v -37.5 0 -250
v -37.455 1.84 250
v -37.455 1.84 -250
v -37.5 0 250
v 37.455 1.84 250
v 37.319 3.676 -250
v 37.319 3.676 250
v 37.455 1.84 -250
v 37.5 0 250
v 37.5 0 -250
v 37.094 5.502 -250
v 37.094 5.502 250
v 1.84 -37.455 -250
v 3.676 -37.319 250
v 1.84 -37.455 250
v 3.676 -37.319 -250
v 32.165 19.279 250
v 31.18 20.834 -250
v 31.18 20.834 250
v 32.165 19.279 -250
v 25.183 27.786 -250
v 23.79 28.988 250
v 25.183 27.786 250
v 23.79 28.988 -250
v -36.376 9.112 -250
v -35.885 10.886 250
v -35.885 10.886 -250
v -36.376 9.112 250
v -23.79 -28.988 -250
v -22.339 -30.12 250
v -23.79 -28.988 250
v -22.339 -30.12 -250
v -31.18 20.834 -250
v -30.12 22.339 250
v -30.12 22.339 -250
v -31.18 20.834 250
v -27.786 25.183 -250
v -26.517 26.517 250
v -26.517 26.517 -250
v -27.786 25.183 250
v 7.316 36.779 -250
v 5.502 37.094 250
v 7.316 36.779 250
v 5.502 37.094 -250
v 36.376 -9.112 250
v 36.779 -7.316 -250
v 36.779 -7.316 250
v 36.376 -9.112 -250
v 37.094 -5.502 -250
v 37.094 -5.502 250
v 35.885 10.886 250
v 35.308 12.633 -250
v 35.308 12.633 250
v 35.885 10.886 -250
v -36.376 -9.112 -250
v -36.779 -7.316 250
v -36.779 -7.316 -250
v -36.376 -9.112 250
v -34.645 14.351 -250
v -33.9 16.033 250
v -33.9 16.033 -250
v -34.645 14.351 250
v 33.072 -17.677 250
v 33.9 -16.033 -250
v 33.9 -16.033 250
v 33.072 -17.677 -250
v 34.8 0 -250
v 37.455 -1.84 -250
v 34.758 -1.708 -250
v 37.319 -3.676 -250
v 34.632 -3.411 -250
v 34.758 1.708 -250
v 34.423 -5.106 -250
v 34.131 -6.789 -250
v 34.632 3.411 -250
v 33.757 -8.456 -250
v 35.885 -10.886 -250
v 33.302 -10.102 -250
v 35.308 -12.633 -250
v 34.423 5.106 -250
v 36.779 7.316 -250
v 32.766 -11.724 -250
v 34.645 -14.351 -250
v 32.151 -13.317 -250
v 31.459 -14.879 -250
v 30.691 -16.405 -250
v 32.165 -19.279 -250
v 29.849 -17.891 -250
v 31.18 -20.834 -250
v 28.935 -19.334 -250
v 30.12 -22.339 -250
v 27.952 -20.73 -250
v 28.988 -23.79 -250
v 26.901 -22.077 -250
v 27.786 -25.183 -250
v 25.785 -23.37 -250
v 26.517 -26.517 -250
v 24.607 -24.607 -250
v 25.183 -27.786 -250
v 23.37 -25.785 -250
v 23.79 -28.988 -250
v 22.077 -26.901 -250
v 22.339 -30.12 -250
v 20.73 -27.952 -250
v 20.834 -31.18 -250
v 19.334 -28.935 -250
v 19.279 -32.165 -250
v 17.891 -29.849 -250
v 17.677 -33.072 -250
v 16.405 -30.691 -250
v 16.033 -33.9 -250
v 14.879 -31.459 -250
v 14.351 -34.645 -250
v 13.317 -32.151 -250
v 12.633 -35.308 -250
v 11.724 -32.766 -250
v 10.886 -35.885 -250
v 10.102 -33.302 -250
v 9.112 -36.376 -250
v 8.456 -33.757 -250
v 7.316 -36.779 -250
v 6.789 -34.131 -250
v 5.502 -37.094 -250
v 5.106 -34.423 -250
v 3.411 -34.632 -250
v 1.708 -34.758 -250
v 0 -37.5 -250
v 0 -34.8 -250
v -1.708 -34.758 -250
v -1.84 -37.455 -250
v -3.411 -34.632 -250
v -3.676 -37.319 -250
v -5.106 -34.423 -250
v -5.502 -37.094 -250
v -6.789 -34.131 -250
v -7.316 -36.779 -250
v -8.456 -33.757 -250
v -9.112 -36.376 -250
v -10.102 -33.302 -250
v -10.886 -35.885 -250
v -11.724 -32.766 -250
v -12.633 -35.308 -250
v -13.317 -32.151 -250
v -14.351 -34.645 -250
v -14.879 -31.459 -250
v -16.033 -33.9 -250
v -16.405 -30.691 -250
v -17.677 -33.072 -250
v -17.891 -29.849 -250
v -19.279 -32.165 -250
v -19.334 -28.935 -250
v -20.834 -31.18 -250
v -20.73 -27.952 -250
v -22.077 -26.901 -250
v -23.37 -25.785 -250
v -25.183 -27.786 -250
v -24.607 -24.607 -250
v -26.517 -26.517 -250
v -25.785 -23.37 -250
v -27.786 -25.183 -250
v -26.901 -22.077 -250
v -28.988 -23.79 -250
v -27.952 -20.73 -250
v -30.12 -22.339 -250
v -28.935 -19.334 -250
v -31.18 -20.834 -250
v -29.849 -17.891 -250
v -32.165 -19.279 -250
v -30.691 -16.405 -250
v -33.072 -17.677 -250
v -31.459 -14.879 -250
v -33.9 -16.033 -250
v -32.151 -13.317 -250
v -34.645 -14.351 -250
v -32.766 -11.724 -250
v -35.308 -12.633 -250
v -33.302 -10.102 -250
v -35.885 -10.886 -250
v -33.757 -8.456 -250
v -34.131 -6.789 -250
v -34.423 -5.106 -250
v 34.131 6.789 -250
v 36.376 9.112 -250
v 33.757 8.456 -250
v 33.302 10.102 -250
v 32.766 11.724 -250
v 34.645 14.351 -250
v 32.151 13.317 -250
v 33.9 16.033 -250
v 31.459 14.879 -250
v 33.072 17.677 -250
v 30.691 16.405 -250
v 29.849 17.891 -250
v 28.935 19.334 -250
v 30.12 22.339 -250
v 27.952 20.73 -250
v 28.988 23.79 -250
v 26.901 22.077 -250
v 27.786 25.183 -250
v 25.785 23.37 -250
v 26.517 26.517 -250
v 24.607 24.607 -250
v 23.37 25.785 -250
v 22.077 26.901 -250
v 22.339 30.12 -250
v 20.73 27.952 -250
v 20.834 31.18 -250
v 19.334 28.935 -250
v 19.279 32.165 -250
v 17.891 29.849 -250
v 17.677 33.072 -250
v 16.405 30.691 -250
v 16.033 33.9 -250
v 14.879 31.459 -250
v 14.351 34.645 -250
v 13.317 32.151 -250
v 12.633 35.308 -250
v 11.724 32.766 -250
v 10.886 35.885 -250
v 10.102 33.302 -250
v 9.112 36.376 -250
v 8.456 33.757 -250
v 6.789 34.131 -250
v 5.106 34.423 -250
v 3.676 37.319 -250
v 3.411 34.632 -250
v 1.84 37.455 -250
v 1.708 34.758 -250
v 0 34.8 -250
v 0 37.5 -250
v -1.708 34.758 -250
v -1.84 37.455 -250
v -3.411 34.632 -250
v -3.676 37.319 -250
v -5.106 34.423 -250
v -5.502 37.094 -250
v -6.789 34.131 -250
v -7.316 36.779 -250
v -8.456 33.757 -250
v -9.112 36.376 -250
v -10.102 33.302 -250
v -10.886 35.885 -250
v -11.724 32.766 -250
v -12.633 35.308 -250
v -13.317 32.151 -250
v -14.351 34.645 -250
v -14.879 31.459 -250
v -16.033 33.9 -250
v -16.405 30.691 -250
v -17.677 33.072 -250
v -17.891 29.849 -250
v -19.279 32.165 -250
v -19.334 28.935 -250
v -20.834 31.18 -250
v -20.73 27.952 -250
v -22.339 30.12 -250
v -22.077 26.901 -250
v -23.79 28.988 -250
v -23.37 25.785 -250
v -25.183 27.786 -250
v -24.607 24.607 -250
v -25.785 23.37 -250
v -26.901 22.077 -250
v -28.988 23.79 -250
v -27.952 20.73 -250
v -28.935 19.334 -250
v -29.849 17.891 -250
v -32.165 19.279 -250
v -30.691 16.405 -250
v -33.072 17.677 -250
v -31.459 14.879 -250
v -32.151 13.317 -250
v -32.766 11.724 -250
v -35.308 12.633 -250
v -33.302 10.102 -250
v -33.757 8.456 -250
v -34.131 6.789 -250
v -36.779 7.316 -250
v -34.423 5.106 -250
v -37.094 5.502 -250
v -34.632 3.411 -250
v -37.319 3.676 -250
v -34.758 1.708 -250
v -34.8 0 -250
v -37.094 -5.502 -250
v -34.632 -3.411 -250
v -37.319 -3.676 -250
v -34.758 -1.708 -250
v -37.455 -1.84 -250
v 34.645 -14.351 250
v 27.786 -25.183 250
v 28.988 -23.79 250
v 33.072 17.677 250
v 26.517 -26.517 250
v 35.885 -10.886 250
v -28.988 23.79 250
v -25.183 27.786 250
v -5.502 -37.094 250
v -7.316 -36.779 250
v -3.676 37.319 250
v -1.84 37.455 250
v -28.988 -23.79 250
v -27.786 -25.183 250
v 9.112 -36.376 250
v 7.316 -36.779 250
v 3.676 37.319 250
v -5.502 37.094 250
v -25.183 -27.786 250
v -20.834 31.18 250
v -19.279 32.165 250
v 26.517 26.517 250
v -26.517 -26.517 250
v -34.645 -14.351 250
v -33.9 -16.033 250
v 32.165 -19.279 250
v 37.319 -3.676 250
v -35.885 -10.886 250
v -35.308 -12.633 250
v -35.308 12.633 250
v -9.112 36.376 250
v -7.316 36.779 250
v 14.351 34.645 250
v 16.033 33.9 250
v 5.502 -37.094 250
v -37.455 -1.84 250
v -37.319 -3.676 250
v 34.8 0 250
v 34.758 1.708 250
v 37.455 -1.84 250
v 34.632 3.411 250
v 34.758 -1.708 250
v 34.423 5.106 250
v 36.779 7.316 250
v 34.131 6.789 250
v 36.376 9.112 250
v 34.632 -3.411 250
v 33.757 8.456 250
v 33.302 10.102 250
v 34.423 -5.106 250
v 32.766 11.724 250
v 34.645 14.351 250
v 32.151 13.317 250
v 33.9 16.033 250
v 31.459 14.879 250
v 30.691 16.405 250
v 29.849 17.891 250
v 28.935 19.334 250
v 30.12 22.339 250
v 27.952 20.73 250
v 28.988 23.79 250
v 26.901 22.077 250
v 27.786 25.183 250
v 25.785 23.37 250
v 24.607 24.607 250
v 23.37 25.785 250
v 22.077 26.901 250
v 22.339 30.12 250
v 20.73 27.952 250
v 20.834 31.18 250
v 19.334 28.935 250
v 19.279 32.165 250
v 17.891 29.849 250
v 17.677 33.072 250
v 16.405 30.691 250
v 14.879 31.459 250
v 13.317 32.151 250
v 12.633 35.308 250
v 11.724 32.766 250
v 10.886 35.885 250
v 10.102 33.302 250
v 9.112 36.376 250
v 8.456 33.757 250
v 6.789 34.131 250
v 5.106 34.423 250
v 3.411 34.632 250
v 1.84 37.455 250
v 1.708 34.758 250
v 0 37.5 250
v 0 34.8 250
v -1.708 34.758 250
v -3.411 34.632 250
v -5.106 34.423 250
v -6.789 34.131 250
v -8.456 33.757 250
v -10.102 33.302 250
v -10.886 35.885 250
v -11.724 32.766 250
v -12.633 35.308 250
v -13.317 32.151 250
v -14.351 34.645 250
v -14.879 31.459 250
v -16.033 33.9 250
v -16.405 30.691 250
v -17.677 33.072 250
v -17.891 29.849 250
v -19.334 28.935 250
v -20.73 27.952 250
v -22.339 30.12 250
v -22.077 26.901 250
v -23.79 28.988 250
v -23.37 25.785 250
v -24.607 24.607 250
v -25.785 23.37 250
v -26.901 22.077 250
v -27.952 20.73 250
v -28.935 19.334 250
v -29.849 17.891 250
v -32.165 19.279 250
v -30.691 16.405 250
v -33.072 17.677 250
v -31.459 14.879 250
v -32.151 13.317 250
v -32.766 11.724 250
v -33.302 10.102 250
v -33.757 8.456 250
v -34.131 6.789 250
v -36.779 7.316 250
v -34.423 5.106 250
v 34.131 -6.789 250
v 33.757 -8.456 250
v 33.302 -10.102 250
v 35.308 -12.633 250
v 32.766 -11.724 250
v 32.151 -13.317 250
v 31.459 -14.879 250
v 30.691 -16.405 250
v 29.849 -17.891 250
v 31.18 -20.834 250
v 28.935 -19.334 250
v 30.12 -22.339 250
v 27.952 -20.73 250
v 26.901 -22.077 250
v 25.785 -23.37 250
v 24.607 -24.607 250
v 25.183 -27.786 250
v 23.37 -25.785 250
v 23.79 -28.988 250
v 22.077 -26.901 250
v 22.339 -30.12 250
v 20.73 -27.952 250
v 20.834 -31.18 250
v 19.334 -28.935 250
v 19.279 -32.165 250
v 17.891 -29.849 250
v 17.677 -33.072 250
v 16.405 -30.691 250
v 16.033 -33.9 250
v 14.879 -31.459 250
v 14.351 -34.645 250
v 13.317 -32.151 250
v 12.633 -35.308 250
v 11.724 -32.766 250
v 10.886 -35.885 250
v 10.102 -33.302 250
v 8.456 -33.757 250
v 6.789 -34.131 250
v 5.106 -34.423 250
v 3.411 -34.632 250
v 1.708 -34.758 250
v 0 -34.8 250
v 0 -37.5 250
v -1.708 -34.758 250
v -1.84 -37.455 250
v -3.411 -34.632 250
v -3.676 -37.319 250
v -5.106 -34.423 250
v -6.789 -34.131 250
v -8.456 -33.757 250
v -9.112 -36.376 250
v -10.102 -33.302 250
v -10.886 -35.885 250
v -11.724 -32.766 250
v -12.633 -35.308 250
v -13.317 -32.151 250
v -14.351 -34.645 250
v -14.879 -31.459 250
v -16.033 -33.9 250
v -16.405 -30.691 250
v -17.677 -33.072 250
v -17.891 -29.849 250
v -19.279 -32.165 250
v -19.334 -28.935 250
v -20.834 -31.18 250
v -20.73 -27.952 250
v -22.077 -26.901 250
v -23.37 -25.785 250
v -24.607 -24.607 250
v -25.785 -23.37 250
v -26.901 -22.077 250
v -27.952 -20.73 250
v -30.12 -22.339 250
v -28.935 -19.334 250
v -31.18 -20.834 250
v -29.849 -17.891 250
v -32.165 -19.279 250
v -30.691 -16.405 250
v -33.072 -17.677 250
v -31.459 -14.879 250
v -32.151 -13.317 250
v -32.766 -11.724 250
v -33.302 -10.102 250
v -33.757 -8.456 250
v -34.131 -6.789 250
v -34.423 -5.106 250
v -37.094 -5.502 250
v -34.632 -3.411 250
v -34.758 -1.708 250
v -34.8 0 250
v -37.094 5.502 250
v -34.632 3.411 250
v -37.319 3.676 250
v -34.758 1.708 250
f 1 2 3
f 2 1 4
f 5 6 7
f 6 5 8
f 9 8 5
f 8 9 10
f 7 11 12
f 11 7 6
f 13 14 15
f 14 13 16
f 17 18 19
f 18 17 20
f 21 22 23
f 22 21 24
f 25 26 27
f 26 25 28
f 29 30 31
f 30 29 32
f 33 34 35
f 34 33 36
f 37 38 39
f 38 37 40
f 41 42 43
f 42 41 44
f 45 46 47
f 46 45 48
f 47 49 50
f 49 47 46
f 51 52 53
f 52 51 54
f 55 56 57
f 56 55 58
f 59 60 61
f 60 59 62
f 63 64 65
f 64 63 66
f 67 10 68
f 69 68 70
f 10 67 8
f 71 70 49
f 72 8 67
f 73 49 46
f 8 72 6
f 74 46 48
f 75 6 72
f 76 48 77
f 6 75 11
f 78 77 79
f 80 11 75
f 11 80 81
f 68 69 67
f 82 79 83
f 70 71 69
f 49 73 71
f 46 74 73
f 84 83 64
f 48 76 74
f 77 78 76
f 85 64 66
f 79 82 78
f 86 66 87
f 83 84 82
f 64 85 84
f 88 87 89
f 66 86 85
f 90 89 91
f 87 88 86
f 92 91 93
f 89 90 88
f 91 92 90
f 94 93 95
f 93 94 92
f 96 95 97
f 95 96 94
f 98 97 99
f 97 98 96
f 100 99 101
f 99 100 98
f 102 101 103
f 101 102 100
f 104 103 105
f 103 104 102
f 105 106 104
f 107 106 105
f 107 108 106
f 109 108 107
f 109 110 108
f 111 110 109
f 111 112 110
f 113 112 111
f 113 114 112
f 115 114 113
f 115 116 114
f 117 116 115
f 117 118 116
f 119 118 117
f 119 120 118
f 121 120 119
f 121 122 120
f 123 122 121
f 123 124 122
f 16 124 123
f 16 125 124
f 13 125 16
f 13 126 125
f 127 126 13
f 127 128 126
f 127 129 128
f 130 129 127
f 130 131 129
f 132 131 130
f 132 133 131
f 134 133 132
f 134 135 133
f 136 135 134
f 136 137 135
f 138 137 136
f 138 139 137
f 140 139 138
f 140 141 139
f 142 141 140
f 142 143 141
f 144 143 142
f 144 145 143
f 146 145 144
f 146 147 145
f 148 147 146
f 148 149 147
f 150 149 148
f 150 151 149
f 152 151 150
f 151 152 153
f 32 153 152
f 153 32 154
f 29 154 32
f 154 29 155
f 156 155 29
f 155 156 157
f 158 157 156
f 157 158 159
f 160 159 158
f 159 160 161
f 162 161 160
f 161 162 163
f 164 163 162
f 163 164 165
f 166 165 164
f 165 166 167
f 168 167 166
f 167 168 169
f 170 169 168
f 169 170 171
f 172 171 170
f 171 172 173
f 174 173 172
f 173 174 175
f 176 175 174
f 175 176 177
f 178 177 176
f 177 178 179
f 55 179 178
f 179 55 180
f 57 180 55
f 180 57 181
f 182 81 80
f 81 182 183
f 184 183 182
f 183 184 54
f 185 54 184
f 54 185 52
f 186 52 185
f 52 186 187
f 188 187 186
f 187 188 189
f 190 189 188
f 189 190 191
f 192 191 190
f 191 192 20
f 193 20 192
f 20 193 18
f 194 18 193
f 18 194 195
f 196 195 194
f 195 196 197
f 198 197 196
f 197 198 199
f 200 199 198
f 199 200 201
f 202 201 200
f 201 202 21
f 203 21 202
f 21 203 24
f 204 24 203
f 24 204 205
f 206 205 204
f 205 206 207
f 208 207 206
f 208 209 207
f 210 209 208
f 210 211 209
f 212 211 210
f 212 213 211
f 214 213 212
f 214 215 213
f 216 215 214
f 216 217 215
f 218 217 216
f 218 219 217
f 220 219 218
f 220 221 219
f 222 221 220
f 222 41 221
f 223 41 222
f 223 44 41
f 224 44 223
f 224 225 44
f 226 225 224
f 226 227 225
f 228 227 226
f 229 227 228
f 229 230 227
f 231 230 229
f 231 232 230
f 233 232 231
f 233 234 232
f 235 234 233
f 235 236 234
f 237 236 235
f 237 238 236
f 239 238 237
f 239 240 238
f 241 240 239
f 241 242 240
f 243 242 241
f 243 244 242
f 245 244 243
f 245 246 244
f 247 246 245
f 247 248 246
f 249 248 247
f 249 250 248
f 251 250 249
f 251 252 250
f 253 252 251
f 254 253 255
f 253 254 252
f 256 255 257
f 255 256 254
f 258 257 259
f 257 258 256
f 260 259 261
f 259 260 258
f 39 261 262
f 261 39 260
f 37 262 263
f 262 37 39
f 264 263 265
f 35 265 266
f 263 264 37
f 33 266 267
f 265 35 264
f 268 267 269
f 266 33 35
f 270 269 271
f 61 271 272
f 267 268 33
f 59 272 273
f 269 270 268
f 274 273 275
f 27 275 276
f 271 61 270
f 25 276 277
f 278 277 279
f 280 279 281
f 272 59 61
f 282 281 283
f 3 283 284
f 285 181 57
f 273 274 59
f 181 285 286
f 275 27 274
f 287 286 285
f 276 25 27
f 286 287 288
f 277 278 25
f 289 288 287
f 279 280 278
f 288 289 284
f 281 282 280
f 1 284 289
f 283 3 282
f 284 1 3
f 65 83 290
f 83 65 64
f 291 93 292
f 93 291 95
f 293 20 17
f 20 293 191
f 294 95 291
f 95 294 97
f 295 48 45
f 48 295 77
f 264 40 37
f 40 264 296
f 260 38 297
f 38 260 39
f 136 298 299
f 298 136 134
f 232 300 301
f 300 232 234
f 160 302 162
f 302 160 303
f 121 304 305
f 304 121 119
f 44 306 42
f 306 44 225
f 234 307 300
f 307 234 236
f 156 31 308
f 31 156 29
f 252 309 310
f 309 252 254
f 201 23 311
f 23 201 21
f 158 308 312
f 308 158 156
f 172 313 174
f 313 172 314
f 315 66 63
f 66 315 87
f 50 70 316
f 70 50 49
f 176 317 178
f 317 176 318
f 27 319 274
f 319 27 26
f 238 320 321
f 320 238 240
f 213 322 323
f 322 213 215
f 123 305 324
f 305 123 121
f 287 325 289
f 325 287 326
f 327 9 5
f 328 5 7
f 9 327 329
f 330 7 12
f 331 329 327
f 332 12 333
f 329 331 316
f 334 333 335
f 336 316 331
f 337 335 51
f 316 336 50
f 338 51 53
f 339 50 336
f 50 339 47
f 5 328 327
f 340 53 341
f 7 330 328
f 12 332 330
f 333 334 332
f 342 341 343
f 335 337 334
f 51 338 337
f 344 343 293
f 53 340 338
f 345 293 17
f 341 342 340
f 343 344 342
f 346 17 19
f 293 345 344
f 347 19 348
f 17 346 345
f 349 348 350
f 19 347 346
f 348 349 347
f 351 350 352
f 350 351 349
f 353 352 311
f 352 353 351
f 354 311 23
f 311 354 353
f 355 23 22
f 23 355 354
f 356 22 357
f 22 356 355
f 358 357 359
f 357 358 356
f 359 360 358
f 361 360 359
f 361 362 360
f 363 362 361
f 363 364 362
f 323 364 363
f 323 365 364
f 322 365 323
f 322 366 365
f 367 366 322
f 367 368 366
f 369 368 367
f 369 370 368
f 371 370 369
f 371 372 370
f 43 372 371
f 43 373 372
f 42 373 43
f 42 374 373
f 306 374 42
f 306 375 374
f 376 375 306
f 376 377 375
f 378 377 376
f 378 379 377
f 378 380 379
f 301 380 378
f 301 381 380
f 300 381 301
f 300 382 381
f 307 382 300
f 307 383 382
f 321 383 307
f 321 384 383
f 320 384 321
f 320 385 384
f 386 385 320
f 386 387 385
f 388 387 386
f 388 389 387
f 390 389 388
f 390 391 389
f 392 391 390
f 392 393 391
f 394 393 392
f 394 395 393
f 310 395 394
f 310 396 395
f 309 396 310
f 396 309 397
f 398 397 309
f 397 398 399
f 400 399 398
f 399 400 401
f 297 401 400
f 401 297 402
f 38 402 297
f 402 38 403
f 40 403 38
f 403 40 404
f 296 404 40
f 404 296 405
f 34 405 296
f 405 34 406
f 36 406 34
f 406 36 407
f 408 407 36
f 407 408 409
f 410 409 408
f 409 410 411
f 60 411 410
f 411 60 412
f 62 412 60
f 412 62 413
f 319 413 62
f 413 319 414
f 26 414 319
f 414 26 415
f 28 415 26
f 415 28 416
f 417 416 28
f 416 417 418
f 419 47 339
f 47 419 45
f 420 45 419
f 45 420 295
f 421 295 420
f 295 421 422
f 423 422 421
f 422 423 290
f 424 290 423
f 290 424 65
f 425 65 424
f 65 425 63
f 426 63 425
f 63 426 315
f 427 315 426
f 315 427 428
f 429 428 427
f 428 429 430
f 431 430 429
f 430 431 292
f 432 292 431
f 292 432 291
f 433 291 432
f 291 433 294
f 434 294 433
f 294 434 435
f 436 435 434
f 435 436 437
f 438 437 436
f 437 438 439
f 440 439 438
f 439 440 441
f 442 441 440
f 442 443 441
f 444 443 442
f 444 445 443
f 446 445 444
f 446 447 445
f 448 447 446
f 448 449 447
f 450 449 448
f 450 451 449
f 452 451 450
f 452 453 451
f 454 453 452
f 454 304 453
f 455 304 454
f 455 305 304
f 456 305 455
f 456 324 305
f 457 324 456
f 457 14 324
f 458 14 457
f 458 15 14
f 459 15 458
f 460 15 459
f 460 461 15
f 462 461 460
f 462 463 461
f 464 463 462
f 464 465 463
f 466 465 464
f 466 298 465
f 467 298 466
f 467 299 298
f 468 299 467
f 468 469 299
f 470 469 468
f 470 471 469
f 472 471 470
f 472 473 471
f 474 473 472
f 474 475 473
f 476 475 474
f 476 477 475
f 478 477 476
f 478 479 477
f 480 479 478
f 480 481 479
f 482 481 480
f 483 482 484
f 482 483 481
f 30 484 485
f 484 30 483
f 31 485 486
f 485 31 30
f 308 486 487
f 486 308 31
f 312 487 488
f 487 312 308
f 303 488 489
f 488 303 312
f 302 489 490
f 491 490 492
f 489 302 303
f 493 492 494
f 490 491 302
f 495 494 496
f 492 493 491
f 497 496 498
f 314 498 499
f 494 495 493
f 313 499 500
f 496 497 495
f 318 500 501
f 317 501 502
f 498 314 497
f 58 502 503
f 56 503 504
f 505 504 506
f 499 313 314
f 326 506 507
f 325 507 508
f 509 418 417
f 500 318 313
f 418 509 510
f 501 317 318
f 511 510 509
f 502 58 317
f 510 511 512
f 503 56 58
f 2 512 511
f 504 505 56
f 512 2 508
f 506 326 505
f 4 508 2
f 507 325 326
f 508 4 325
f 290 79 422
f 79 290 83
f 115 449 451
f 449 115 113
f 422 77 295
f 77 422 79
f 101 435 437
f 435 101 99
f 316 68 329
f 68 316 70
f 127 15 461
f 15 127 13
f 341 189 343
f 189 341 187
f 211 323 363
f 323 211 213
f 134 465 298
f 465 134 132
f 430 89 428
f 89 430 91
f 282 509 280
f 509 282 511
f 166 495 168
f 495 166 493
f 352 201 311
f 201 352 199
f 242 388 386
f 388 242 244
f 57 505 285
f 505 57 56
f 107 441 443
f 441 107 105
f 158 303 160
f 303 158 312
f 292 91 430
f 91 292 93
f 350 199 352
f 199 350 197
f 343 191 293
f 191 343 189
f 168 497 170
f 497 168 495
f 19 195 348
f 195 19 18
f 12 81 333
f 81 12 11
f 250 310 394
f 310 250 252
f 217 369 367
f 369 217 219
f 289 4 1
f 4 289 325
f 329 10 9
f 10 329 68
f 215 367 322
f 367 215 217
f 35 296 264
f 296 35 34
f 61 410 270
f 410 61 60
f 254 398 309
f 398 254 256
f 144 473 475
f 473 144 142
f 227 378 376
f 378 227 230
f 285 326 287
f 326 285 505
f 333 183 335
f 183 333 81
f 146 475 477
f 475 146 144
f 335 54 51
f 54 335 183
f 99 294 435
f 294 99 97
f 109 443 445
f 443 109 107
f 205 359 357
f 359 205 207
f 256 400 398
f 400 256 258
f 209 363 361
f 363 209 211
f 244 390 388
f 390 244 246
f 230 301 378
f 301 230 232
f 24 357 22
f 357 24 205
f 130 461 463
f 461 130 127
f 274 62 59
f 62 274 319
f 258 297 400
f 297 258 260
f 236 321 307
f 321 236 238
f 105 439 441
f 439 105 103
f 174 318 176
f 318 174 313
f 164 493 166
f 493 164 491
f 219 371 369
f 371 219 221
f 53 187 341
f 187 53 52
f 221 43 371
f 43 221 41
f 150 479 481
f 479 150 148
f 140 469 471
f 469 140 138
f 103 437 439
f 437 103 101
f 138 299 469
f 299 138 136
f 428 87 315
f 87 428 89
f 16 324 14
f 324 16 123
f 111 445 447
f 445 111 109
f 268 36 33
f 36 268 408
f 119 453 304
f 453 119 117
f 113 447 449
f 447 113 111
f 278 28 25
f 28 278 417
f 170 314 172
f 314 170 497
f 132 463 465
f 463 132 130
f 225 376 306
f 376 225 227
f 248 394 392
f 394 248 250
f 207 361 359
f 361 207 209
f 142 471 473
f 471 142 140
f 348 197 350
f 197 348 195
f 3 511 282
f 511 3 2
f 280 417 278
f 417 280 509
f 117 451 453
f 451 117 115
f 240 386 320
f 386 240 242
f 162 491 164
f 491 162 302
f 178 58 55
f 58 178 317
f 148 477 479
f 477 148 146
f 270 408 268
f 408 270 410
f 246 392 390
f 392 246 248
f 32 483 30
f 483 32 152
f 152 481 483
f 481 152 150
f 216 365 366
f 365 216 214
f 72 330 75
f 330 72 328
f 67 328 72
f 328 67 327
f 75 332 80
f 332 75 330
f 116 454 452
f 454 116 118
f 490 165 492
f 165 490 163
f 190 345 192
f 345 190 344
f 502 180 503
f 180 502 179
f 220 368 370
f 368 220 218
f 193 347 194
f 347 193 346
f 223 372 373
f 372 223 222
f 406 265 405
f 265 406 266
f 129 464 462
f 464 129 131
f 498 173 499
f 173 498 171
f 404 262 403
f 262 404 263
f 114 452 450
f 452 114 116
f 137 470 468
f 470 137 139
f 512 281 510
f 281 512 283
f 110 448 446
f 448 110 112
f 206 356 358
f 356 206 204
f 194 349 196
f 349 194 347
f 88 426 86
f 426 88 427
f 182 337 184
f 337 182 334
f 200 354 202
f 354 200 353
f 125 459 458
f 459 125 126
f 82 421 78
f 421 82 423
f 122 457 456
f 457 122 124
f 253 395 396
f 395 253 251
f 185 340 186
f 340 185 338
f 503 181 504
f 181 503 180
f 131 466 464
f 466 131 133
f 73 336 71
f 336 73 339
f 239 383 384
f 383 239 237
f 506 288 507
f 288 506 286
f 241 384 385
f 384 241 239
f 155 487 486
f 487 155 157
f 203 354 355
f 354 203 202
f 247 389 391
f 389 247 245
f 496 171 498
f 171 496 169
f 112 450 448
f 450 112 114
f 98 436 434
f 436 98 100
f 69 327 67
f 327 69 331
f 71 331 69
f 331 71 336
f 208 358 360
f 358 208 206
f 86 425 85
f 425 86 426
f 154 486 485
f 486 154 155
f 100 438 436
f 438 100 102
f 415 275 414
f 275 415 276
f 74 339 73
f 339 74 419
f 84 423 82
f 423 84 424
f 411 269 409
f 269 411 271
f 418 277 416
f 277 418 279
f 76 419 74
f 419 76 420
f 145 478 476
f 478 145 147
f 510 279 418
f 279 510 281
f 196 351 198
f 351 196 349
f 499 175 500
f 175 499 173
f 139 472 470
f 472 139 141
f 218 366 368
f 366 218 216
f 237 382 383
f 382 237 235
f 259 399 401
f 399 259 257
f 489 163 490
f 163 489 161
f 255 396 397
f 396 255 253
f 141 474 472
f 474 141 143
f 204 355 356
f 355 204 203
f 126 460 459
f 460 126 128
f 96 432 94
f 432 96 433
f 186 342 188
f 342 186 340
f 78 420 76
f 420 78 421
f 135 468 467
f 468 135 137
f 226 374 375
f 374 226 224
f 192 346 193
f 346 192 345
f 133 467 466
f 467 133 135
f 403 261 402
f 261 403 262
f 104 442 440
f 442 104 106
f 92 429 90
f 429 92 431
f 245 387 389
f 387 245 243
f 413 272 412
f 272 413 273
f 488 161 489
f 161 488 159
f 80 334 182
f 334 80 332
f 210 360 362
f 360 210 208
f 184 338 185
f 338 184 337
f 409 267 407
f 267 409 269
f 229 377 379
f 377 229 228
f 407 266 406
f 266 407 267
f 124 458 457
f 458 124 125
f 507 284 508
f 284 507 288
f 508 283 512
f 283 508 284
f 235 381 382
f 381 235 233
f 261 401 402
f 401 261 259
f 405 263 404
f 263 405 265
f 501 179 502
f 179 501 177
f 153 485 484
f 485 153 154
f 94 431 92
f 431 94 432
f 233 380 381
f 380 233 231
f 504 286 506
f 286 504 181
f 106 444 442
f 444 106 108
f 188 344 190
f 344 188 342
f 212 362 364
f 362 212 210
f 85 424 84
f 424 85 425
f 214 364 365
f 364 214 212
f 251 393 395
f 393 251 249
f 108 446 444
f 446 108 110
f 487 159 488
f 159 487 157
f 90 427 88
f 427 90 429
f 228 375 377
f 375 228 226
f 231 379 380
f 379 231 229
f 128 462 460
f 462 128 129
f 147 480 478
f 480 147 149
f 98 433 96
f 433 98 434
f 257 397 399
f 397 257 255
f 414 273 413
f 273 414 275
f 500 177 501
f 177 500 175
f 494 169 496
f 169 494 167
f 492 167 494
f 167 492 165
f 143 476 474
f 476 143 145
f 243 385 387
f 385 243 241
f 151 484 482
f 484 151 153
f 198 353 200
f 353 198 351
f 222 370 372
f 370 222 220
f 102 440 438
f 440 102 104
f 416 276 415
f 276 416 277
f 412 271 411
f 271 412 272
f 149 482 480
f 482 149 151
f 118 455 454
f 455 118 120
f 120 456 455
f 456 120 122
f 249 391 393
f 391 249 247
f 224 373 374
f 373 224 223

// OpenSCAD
$fn=128;

module ht_pipe(od=75, length=500, wall=2.7) {
    difference() {
        cylinder(h=length, d=od, center=true);
        cylinder(h=length+2, d=od-2*wall, center=true);
    }
}

ht_pipe(od=75, length=500, wall=2.7);
